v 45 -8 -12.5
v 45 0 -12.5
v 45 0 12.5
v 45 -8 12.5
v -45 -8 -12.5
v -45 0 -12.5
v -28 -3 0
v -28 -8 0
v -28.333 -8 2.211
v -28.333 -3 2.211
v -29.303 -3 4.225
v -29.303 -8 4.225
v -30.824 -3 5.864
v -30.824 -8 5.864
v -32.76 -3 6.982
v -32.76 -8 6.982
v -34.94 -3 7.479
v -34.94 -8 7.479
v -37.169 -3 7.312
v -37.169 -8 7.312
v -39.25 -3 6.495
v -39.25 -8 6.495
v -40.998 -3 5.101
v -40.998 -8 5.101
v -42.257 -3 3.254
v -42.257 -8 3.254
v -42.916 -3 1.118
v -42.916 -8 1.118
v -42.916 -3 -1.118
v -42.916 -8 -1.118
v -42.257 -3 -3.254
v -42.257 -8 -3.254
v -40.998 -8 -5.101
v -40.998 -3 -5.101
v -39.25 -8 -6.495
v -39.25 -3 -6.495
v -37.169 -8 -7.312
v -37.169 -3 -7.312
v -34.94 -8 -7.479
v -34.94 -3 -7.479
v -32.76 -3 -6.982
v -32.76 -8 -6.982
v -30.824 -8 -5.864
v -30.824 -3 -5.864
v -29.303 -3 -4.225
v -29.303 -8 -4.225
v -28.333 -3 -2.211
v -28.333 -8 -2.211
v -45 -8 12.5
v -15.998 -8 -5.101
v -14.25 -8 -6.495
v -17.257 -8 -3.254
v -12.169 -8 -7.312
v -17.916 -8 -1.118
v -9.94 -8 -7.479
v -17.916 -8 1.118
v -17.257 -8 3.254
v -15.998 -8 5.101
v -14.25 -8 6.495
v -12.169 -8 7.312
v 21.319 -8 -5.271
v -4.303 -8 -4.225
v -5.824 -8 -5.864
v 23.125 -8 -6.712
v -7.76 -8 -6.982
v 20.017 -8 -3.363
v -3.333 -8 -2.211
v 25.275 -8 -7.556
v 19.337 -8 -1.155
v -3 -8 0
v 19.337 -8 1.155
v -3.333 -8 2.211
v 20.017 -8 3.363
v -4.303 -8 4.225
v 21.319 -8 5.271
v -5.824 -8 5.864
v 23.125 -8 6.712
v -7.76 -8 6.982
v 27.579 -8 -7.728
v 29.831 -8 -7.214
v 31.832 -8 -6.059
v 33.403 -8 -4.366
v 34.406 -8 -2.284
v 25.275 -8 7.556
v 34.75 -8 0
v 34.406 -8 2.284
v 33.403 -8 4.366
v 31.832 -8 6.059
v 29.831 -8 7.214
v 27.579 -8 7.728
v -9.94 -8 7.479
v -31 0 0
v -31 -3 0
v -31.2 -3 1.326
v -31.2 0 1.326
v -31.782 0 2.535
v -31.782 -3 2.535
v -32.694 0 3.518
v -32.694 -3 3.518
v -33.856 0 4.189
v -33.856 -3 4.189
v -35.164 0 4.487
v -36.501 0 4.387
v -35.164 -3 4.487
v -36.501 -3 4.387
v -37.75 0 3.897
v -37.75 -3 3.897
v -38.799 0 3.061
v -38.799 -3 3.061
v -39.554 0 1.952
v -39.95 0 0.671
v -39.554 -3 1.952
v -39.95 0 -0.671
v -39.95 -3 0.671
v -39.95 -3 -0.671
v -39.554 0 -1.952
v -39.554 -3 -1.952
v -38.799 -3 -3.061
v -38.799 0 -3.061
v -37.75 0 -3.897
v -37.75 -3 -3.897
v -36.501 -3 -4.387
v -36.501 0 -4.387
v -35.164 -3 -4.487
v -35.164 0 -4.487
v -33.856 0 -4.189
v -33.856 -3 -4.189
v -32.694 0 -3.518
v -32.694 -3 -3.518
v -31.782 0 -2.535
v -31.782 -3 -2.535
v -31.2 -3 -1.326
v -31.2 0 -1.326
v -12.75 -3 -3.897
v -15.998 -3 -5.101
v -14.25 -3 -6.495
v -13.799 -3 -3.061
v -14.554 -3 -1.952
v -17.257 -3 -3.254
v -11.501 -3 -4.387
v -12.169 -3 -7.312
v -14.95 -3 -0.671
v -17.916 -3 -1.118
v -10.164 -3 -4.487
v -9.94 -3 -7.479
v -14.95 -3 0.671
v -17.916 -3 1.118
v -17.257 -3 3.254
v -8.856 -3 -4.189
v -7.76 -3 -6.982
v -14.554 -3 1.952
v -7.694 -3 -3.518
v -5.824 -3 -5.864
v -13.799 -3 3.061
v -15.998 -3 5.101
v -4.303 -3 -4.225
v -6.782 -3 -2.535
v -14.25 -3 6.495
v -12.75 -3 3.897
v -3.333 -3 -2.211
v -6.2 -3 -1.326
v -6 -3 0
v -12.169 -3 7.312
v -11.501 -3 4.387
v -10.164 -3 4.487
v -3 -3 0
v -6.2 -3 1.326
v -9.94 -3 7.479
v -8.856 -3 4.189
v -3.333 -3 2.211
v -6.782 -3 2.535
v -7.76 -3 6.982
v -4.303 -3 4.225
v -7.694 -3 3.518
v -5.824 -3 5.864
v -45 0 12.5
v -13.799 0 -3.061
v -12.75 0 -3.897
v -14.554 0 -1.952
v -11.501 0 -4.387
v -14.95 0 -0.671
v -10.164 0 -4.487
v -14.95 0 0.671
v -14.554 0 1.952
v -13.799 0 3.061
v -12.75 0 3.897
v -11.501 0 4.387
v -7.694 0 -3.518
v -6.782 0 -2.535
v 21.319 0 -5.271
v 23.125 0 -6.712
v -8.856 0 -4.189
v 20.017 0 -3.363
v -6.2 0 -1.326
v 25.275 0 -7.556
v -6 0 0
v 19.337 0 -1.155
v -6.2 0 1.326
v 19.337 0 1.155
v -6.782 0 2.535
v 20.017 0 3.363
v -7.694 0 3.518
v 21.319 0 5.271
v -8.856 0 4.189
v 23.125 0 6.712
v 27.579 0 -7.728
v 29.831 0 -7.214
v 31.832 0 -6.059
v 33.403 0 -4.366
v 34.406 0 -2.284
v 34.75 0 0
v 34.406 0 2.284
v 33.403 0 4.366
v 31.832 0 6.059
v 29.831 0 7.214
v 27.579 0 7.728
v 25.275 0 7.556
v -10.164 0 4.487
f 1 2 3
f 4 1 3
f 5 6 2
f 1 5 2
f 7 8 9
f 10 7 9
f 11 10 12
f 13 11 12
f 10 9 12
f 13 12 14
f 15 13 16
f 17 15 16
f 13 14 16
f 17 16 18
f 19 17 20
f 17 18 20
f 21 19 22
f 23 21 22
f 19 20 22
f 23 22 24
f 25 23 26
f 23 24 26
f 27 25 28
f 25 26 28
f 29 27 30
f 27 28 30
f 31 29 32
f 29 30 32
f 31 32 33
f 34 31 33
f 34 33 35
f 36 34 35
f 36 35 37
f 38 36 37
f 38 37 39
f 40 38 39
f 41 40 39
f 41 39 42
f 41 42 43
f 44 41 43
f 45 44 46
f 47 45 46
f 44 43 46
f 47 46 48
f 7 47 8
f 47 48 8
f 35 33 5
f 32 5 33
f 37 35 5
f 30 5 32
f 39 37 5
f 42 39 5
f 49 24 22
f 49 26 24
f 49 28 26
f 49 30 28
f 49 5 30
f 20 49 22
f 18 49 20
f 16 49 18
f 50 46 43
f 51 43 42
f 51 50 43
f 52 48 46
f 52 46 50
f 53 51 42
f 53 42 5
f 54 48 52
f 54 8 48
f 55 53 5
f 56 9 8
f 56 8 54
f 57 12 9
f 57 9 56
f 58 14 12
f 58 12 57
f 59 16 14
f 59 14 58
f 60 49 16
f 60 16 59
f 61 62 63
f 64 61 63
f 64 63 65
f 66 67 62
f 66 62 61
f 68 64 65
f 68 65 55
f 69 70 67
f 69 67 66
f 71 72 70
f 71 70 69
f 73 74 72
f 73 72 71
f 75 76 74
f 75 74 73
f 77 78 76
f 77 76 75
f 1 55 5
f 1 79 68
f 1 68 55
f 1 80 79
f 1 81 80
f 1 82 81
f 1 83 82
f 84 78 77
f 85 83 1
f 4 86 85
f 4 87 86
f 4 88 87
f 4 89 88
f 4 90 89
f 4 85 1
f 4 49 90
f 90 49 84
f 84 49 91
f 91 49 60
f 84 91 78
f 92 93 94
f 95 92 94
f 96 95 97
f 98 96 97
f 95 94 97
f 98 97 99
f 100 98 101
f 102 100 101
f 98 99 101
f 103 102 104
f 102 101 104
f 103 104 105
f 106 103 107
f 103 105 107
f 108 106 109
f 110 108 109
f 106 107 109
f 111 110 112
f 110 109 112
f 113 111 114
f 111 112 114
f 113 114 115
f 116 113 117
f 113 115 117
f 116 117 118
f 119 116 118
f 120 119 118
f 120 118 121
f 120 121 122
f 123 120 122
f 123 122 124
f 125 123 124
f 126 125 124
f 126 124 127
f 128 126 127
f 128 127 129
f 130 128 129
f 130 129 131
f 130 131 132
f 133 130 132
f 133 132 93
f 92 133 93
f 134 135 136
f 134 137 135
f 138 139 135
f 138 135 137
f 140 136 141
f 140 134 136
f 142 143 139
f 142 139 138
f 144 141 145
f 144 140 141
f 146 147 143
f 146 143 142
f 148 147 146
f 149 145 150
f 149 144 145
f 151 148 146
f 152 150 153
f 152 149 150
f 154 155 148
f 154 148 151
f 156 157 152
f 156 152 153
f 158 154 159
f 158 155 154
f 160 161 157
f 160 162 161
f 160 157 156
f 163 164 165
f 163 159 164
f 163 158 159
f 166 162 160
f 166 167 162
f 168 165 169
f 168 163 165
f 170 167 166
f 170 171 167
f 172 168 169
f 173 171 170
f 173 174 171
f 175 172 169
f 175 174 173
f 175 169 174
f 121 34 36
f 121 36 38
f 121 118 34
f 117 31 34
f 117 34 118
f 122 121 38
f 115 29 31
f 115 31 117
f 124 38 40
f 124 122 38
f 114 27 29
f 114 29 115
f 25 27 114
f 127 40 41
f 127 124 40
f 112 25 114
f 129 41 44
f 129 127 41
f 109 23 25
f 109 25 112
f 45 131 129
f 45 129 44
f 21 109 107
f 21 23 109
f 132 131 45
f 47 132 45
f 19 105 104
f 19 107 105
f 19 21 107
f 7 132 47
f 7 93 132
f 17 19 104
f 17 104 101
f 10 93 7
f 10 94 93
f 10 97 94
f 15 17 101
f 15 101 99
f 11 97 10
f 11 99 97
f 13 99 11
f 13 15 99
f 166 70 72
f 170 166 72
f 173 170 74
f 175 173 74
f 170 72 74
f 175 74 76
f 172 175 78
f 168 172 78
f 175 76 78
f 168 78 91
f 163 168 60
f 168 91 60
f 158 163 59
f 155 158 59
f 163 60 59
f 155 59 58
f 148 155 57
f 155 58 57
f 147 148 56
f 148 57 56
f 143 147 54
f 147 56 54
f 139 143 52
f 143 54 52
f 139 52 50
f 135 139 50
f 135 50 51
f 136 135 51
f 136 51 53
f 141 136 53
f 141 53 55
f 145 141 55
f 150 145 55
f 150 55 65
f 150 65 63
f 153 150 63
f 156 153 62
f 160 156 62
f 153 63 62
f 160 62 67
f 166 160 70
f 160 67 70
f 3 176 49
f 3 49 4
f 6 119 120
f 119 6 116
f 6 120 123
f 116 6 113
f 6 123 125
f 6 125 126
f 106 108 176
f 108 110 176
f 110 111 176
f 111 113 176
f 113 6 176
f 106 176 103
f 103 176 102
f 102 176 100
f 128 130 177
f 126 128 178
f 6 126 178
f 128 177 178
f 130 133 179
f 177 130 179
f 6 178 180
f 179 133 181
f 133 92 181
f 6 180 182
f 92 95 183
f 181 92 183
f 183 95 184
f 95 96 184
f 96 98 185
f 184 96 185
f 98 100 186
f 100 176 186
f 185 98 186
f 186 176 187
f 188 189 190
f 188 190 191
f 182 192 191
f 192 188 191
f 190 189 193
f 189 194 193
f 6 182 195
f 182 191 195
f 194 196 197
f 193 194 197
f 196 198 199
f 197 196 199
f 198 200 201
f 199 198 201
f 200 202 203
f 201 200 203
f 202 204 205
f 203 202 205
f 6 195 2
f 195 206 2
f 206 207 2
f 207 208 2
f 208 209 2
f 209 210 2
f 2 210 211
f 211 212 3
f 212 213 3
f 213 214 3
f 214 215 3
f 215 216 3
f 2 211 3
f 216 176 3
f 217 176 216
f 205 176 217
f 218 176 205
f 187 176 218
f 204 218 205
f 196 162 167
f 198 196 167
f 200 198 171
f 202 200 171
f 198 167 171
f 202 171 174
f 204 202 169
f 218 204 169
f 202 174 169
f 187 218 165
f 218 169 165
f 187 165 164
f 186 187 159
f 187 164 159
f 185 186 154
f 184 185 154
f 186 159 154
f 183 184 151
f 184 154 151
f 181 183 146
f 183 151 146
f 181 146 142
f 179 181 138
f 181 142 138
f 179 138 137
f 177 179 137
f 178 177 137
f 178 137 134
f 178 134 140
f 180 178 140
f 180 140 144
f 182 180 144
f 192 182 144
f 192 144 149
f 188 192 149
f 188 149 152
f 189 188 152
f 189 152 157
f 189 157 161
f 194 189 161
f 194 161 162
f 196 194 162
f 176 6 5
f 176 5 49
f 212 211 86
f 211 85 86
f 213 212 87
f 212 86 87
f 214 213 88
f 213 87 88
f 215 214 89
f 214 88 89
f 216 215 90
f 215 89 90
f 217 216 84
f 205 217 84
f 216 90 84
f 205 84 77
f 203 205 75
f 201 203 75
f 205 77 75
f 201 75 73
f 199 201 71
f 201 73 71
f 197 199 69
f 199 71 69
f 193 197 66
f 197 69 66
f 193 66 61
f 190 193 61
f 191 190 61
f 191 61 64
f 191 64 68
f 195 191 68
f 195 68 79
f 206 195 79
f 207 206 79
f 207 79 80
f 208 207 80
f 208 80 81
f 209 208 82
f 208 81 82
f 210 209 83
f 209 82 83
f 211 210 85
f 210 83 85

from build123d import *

# Parameters (mm, degrees)
F0_W     = 90
F0_H     = 25
F1_DEPTH = 8
F2_R     = 4.5
F2_R_2   = 7.75
F3_DEPTH = 8
F2_R_3   = 7.5
F4_DEPTH = 5


with BuildPart() as f1:
    # F0 (on Front) → F1 (new body)
    with BuildSketch(Plane.XZ):
        Rectangle(F0_W, F0_H)
    extrude(amount=F1_DEPTH)

    # F2 (on face) → F3 (cut, through all)
    with BuildSketch(Plane.XZ.offset(8)):
        with Locations((-35.5, 0)):
            Circle(F2_R)
        with Locations((-10.5, 0)):
            Circle(F2_R)
        with Locations((27, 0)):
            Circle(F2_R_2)
    extrude(amount=-F3_DEPTH, mode=Mode.SUBTRACT)

    # F2 (on face) → F4 (cut)
    with BuildSketch(Plane.XZ.offset(8)):
        with Locations((-35.5, 0)):
            Circle(F2_R_3)
        with Locations((-35.5, 0)):
            Circle(F2_R, mode=Mode.SUBTRACT)
        with Locations((-10.5, 0)):
            Circle(F2_R_3)
        with Locations((-10.5, 0)):
            Circle(F2_R, mode=Mode.SUBTRACT)
        with Locations((27, 0)):
            Circle(F2_R_2)
    extrude(amount=-F4_DEPTH, mode=Mode.SUBTRACT)


solid = f1.part
